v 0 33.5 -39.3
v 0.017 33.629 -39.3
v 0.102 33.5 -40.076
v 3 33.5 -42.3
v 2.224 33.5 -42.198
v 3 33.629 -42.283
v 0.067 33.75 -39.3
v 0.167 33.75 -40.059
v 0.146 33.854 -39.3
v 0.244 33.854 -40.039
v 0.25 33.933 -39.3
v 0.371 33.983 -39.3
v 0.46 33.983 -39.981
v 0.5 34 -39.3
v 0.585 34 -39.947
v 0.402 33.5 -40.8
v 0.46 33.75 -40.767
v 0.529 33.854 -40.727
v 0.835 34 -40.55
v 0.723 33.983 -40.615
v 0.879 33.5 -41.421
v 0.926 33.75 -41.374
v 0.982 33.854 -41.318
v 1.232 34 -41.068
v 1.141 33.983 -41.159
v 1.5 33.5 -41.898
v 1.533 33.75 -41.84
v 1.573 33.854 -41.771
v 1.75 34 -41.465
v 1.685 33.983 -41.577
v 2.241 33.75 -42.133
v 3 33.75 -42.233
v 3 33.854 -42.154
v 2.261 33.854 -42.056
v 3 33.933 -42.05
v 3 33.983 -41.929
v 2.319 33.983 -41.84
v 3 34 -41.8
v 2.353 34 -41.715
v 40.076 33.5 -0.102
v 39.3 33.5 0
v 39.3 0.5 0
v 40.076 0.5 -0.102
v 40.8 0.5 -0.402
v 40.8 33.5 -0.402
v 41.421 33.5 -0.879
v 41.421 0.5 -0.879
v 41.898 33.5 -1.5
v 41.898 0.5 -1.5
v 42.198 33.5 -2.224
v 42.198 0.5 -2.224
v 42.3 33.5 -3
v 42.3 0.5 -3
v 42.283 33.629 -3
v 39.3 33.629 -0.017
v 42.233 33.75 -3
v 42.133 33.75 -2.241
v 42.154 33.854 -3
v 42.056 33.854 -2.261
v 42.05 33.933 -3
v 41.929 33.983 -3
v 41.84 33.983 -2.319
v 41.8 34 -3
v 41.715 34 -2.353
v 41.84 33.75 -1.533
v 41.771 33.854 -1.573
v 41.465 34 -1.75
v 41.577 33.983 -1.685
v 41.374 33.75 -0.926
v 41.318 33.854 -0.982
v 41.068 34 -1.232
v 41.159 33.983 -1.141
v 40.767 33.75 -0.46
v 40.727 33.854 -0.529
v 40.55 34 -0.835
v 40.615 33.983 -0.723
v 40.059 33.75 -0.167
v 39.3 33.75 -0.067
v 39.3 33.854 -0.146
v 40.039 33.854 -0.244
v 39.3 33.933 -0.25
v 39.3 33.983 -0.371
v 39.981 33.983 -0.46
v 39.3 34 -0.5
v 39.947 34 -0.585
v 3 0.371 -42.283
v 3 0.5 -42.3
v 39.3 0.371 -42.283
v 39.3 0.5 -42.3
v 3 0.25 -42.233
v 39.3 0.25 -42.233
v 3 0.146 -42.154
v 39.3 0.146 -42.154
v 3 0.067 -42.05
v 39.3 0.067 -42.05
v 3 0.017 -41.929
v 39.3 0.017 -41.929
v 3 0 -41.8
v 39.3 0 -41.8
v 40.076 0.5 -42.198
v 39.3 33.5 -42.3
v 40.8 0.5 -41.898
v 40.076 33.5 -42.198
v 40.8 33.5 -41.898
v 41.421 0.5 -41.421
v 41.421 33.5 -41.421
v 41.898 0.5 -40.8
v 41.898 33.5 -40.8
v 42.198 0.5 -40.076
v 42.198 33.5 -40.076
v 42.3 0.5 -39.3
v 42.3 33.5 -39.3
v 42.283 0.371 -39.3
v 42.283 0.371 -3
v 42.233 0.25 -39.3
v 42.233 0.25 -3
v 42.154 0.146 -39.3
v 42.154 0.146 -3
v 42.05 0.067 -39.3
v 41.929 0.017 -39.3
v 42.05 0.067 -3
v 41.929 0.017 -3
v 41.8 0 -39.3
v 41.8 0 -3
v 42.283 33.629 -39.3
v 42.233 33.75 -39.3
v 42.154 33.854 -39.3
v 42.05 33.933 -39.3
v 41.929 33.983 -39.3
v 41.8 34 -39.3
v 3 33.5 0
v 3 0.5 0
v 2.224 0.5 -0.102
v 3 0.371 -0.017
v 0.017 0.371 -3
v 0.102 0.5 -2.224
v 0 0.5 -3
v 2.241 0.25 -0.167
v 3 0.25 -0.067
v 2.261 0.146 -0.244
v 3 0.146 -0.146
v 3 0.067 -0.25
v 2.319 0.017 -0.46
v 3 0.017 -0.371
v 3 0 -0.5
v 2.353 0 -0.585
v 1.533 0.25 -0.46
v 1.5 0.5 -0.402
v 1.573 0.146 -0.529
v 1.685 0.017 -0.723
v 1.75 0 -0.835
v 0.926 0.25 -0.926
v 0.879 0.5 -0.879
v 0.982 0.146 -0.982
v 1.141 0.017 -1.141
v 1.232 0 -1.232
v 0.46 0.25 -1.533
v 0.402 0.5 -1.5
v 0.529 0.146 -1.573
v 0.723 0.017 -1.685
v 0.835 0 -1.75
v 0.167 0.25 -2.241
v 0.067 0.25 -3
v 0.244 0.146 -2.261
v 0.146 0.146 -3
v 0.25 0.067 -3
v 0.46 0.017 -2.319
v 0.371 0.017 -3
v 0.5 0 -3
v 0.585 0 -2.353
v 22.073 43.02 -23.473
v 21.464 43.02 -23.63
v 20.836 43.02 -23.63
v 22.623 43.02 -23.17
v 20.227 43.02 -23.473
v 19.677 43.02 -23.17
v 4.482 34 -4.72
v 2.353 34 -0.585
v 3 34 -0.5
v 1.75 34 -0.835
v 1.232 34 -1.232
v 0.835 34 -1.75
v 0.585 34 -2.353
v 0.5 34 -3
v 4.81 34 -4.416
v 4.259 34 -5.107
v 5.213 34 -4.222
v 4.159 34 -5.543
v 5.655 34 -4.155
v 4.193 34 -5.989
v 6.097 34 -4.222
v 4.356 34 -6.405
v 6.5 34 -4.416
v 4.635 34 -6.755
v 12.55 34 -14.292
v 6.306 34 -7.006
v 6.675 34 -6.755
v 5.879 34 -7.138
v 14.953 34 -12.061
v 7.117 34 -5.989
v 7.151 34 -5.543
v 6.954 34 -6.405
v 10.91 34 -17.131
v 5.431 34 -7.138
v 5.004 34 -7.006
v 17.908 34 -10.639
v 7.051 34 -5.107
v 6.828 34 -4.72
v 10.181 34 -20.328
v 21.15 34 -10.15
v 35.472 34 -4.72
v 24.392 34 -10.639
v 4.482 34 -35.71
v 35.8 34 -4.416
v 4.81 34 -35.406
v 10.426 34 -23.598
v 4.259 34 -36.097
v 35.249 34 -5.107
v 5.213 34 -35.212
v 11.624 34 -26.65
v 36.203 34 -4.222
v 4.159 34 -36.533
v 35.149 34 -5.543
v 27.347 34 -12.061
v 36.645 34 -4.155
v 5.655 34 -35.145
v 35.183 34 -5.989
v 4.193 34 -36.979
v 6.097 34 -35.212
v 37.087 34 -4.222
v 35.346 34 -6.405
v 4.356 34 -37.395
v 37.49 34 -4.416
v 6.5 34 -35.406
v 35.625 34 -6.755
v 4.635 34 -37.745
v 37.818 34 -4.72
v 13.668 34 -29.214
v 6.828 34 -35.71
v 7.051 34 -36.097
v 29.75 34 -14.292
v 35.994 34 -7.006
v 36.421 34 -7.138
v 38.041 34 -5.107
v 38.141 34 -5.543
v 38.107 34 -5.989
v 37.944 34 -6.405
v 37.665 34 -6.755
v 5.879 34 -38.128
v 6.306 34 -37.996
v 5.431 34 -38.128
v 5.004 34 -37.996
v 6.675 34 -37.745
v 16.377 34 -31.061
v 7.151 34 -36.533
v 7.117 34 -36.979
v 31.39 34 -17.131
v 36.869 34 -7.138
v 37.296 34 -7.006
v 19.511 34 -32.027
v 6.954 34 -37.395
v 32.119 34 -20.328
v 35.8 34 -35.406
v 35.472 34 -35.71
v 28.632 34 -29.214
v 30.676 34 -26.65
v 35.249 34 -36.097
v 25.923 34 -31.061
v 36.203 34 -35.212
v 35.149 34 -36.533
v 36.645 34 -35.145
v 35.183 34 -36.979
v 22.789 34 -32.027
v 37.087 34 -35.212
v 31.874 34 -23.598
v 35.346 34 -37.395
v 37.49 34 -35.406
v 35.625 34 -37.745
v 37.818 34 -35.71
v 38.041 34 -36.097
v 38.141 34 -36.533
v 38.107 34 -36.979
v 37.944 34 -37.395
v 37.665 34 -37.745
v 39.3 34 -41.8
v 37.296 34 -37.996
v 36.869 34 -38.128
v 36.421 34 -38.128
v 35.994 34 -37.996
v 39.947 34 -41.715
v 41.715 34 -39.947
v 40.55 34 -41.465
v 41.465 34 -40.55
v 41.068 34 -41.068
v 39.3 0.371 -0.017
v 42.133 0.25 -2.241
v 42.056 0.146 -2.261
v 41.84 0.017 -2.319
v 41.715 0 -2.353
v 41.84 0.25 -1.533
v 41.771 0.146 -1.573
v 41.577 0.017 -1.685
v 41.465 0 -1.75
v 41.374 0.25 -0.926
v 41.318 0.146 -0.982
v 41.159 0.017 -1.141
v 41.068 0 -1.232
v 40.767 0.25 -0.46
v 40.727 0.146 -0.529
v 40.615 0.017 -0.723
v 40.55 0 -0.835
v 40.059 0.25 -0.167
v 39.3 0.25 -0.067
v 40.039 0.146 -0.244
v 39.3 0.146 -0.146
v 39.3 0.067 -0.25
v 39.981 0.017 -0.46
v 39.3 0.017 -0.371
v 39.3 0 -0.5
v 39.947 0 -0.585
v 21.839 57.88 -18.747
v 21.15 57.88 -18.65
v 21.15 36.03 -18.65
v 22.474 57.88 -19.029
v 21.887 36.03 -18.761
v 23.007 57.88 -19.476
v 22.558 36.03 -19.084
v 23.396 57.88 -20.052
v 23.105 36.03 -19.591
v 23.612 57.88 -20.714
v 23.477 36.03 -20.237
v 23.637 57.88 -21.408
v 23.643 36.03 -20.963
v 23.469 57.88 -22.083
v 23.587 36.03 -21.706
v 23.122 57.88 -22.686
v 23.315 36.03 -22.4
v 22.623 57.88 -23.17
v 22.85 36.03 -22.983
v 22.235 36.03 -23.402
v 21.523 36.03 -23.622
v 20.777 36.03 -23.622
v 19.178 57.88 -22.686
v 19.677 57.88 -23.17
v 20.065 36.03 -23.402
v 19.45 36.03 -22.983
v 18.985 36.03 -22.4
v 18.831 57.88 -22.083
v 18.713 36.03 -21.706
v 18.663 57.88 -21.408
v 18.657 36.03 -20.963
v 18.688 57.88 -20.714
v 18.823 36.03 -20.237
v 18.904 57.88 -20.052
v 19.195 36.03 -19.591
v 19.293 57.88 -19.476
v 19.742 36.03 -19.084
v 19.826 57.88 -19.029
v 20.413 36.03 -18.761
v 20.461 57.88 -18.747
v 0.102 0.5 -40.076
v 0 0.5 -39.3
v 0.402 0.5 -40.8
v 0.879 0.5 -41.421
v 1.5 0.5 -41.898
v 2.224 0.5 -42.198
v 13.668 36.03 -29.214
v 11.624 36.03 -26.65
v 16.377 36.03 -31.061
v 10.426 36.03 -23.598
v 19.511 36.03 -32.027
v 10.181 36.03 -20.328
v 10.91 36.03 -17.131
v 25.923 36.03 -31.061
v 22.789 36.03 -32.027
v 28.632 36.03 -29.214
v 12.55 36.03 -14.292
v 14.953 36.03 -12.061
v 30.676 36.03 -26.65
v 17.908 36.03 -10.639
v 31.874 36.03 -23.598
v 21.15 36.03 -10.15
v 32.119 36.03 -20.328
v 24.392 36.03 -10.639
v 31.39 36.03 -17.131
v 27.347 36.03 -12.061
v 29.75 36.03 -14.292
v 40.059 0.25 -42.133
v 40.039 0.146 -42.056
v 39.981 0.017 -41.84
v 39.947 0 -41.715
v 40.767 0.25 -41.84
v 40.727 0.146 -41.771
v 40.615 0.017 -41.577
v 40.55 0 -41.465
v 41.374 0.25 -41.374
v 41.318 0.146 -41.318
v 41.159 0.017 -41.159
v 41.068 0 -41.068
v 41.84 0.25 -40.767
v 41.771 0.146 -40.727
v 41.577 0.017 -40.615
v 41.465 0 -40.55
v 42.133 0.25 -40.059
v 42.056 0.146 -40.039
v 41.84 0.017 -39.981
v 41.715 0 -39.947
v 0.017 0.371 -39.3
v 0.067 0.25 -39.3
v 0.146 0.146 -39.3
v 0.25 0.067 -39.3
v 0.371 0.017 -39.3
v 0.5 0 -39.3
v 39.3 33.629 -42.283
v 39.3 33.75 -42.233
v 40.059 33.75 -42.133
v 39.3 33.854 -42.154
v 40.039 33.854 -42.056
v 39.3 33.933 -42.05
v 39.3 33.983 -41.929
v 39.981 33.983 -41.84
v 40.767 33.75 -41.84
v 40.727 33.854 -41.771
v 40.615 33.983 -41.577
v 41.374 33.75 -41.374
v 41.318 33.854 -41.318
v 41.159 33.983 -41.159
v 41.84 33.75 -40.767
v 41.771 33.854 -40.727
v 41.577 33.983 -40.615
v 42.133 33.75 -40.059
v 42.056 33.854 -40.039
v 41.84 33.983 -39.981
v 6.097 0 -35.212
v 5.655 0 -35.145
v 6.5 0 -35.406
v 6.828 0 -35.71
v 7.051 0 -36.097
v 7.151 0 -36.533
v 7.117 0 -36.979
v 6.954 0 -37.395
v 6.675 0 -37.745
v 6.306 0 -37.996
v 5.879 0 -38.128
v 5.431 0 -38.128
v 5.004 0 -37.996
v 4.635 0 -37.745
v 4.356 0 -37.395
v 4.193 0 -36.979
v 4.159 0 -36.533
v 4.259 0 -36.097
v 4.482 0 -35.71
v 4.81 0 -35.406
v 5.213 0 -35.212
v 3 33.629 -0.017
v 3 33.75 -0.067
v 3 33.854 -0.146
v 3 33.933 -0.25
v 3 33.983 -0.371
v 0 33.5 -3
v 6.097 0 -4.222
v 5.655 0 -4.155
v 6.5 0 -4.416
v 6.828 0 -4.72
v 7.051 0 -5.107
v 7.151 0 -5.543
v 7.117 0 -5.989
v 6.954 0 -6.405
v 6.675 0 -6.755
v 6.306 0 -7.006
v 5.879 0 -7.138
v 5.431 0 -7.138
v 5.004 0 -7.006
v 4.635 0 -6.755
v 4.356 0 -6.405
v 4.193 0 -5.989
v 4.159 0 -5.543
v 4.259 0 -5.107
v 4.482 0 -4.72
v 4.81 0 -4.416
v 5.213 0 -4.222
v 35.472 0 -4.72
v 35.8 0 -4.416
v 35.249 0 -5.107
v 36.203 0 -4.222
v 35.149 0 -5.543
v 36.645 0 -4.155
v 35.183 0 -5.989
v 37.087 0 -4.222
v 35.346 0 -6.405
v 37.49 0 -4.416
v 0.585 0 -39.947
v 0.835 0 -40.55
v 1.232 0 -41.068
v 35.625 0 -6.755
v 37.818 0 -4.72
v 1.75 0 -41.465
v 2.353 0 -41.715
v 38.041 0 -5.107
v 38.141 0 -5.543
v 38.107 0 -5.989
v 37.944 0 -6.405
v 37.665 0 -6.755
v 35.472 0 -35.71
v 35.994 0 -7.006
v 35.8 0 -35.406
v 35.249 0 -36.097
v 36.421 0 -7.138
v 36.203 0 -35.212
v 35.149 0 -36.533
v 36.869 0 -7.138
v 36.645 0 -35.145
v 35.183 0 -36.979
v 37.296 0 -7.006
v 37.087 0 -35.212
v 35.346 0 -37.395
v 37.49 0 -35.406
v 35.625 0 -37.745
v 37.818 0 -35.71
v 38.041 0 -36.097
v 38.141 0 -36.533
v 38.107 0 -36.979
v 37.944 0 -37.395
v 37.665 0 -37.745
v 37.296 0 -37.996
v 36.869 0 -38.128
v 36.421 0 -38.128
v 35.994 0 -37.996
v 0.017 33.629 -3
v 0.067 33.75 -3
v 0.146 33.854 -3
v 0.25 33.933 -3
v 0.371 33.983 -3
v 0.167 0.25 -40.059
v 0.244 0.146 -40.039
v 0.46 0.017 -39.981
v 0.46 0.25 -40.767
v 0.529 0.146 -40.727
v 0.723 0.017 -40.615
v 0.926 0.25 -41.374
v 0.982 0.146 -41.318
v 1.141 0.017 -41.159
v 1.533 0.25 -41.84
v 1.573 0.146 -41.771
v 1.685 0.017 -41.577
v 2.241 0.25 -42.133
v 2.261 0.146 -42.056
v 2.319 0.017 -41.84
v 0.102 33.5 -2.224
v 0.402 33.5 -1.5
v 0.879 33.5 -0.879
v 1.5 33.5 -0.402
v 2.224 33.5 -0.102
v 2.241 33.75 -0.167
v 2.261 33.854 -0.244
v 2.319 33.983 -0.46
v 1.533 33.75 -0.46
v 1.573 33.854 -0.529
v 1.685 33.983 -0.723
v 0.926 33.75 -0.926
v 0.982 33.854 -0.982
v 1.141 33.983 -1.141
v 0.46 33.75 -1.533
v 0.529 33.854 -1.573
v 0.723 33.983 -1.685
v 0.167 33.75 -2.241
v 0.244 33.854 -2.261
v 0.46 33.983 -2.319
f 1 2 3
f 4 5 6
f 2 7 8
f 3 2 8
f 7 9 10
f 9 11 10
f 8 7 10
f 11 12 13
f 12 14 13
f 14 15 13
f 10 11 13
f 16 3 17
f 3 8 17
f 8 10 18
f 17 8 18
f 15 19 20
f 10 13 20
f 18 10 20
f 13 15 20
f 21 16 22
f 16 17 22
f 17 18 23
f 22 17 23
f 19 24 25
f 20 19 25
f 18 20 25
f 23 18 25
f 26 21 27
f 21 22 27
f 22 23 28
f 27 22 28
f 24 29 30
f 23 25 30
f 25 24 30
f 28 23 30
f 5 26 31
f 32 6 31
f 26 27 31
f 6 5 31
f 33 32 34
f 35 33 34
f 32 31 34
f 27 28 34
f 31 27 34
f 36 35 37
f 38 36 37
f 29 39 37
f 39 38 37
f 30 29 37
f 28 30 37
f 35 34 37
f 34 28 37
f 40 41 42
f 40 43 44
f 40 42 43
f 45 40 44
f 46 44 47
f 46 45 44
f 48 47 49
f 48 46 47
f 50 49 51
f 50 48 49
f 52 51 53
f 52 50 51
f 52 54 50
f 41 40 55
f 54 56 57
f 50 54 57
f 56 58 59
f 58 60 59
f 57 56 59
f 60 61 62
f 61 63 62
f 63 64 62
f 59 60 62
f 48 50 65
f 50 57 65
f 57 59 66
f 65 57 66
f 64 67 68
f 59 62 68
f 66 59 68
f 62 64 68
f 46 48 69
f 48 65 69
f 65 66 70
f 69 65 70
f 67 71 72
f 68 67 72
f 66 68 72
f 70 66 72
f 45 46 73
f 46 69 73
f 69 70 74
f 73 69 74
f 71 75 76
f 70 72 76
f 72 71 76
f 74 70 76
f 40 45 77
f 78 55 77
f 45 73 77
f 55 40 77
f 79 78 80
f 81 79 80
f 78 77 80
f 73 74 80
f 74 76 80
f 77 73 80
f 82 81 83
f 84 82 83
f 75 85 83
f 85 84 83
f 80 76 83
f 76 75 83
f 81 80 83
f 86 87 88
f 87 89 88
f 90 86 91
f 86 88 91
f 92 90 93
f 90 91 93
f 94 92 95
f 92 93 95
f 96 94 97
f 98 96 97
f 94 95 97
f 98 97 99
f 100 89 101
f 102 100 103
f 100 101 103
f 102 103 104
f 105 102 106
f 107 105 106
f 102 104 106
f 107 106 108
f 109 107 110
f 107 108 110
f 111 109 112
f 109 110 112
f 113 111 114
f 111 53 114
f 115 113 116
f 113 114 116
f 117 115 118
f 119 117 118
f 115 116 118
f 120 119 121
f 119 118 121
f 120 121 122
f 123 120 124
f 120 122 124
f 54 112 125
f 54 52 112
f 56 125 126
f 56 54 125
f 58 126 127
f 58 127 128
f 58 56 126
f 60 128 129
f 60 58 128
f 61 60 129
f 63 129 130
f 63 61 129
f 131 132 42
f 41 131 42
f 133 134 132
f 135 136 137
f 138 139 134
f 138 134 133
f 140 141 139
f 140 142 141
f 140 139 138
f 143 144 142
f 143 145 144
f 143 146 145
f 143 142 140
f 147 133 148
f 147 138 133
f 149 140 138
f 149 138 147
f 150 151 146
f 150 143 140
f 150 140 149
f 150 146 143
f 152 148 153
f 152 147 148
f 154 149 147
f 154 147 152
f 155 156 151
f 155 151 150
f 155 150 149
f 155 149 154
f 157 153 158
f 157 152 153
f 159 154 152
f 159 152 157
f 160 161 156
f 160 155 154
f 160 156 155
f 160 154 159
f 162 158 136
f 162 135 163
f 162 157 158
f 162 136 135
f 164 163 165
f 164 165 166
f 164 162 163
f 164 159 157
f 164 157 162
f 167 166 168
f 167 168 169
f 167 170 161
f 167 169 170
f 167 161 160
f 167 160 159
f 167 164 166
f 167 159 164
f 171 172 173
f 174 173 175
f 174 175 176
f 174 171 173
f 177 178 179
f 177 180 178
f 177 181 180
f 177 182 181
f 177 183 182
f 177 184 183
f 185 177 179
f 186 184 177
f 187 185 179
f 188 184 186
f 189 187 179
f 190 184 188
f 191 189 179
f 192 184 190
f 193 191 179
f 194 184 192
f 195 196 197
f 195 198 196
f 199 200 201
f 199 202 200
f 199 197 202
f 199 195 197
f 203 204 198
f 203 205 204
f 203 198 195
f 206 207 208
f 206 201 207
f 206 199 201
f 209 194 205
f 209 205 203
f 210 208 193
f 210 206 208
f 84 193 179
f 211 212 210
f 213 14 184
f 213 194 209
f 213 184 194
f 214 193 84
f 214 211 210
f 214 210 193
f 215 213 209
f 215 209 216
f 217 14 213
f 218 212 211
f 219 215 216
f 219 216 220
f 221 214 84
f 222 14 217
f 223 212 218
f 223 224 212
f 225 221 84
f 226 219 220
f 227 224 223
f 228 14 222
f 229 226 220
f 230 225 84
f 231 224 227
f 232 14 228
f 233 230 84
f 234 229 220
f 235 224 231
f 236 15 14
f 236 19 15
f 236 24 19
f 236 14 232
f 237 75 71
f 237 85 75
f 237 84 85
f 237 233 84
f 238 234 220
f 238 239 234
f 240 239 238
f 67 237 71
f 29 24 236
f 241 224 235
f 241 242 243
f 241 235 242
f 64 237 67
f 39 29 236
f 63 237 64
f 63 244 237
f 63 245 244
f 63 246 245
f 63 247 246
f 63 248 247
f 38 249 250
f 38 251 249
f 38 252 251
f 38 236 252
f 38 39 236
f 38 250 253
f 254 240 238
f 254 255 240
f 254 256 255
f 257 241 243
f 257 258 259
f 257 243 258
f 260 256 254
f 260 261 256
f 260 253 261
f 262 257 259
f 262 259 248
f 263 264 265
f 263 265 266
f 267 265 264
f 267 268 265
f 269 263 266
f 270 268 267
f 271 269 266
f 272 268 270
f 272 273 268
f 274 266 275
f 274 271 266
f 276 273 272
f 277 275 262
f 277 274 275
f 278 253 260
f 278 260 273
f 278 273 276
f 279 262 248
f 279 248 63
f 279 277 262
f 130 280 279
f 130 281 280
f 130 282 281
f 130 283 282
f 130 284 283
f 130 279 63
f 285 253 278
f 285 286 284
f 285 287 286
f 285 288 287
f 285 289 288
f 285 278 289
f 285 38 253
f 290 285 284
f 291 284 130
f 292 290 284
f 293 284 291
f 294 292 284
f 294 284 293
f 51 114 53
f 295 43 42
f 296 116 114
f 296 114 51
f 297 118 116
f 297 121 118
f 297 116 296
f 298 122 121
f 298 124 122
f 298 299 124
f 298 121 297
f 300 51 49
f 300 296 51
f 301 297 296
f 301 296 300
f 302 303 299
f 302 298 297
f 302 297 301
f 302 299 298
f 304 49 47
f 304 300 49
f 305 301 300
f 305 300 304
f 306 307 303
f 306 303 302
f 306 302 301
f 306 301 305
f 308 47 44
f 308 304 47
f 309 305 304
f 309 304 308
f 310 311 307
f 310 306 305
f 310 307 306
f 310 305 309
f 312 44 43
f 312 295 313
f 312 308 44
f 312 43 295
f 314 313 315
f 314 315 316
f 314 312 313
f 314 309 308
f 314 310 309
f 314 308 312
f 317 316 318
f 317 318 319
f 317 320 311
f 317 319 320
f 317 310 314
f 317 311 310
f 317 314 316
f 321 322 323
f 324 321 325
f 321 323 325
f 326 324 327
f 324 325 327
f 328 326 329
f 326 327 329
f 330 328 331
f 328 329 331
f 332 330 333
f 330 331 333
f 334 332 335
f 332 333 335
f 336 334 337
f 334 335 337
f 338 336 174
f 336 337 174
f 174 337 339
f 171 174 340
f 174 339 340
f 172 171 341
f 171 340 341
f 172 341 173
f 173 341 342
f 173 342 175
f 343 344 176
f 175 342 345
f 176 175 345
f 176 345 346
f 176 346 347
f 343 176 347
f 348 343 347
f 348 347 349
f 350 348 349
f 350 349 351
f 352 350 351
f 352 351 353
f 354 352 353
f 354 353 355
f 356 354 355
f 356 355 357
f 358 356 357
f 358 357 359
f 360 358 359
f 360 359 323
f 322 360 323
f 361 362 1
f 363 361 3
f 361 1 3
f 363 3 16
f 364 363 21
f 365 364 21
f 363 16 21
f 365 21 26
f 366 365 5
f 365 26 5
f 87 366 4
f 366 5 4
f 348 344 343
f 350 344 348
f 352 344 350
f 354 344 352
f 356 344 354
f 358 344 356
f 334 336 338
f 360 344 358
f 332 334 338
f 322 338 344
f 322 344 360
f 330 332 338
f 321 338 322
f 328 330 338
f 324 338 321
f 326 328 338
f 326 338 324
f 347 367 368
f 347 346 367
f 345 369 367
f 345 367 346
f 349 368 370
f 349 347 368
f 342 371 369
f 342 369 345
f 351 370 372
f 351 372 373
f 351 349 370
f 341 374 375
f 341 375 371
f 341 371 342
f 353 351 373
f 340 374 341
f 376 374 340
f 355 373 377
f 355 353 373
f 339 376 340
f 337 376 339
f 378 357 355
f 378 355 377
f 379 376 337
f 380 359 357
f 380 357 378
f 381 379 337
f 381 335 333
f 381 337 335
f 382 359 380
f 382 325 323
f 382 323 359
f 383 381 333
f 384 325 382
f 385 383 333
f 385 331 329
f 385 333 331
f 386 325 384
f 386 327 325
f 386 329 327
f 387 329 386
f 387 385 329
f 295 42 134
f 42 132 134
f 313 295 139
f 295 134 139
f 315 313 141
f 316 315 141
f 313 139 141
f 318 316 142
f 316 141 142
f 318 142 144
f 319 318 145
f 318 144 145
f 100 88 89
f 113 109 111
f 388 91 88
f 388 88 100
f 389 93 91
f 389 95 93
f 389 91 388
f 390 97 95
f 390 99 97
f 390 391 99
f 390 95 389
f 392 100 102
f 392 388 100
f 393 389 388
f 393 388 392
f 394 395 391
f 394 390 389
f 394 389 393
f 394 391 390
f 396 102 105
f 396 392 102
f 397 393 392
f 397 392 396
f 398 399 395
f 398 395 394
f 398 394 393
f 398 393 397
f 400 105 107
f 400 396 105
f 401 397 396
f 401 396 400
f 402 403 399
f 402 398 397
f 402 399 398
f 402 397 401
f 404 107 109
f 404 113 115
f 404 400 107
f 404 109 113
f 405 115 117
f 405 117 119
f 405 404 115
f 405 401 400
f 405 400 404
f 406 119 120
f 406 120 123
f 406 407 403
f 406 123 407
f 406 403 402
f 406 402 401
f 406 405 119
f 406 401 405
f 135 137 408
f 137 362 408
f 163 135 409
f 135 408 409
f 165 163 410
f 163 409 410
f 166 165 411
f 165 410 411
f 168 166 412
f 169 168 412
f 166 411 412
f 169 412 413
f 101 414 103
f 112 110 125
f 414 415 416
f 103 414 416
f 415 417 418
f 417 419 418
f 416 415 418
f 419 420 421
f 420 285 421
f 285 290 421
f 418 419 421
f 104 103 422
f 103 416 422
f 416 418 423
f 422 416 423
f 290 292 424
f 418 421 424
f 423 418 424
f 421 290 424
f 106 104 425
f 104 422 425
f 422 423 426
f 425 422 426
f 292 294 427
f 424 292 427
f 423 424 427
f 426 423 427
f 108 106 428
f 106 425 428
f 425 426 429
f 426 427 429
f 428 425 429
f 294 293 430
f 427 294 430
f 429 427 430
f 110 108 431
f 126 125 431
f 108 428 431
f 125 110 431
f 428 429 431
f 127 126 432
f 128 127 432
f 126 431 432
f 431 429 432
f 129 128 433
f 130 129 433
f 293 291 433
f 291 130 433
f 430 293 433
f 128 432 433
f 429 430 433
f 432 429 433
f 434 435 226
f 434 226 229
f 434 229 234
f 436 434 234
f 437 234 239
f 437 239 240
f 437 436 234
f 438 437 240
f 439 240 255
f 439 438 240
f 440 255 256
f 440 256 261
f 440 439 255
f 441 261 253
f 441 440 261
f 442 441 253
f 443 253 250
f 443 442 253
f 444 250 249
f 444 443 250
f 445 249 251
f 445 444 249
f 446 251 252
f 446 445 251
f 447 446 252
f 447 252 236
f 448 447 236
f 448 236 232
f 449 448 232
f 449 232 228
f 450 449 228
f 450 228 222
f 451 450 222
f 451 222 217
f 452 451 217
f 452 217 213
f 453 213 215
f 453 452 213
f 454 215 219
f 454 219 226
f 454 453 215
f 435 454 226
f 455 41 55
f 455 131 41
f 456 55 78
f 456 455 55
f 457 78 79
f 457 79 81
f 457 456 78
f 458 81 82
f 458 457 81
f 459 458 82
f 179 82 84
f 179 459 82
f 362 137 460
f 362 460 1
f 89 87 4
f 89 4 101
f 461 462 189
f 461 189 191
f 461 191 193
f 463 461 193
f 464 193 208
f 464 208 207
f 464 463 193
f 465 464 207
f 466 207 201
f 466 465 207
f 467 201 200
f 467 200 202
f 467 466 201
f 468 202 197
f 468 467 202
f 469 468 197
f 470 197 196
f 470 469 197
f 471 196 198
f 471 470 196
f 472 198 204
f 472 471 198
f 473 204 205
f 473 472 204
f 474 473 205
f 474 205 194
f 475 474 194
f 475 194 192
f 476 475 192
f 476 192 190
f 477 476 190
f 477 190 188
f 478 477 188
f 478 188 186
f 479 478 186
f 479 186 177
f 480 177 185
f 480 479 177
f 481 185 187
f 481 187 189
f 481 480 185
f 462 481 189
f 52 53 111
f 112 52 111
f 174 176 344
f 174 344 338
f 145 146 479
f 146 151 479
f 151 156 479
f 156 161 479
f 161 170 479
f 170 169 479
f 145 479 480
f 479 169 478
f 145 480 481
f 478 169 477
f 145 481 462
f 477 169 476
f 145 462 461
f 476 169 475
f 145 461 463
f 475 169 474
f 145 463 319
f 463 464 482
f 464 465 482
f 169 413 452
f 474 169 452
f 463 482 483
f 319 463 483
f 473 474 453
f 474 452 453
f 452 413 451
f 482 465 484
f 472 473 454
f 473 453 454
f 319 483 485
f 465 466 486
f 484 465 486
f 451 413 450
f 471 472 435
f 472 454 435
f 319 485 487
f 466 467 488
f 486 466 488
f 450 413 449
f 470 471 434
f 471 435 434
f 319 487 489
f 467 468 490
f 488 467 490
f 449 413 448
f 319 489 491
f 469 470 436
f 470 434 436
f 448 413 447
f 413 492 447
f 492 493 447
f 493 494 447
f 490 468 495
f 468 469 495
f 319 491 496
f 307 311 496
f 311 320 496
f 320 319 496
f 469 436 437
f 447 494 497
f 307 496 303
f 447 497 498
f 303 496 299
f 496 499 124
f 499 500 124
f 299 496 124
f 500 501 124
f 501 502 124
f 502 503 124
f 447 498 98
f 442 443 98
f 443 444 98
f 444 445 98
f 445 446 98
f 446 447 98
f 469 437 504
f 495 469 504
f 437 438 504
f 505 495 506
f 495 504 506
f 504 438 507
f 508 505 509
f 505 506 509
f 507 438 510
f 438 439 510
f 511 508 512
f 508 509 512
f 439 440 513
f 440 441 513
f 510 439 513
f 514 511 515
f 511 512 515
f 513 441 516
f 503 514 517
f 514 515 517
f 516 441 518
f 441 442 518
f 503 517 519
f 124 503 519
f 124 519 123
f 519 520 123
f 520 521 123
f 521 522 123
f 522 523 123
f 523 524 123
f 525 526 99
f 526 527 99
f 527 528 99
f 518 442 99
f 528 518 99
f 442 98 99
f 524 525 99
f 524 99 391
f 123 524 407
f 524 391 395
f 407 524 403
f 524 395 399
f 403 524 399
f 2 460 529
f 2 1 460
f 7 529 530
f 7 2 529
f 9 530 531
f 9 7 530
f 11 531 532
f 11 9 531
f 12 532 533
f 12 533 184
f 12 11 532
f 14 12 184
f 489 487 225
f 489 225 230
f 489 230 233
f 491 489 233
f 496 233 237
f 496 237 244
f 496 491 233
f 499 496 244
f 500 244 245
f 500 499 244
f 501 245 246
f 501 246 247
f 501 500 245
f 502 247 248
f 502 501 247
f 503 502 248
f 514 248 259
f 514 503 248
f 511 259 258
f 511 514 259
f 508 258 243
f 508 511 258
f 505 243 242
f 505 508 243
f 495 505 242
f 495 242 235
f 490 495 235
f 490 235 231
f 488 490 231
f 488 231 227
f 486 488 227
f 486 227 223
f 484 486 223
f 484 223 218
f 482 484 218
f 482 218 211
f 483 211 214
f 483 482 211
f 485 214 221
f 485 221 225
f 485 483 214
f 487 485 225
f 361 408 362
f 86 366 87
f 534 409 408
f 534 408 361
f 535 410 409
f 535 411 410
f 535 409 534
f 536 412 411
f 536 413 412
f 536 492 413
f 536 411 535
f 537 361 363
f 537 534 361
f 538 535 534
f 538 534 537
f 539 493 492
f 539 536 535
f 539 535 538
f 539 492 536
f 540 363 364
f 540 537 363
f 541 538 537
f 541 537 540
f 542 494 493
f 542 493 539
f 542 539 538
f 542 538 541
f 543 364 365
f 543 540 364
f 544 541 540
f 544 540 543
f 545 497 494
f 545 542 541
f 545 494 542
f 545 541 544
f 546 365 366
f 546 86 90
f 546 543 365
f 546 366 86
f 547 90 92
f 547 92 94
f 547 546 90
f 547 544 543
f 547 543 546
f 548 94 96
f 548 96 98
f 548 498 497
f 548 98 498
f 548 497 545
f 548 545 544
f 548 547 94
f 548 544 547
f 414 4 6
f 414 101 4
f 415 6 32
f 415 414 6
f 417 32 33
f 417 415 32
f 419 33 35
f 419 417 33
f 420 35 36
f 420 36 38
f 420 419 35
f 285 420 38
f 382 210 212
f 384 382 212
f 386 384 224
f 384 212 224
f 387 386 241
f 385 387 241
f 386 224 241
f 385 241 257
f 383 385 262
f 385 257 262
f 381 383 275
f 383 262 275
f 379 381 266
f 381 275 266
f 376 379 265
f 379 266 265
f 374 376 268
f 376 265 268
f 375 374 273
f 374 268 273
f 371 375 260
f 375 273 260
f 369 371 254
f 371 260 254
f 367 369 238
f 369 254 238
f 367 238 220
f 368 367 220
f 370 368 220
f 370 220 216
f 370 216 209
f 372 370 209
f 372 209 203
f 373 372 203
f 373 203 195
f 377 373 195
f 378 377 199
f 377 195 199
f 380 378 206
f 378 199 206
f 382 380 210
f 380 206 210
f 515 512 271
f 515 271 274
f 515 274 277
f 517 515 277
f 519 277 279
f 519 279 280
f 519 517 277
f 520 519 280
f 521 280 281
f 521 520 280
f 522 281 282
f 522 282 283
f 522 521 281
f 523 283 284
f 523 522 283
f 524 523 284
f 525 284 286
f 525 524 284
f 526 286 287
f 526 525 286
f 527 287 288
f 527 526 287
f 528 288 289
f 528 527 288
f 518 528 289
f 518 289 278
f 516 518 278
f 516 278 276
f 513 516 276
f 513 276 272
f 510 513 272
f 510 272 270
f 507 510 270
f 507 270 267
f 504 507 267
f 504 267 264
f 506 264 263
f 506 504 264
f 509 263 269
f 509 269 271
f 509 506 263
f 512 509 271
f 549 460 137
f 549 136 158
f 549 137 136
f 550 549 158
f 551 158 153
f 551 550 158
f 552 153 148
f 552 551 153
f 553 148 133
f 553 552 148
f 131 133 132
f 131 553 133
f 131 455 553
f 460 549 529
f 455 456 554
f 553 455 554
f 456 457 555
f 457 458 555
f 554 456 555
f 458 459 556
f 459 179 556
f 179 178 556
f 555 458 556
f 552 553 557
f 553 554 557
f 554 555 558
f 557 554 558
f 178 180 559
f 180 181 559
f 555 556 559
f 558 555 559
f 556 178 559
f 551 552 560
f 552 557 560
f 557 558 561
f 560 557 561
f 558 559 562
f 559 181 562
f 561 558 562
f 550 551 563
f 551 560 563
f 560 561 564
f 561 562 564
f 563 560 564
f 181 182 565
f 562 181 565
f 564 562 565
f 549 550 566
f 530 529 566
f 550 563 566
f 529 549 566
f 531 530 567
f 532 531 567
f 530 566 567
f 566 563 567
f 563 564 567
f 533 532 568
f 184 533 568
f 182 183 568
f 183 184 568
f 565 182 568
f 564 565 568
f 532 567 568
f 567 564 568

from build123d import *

# Parameters (mm, degrees)
SKETCH2_W           = 42.3
SKETCH2_H           = 42.3
SKETCH2_R           = 1.5
BOSS_EXTRUDE1_DEPTH = 34
SKETCH3_R           = 11
BOSS_EXTRUDE2_DEPTH = 2.03
SKETCH4_R           = 2.5
BOSS_EXTRUDE3_DEPTH = 21.85
CUT_EXTRUDE1_START  = -14.86
CUT_EXTRUDE1_DEPTH  = 14.86
FILLET1_R           = 3
FILLET2_R           = 0.5


with BuildPart() as part:
    # Sketch2 → Boss-Extrude1 (new body)
    with BuildSketch(Plane(origin=(0, 0, 0), x_dir=(1, 0, 0), z_dir=(0, 1, 0))):
        with Locations((21.15, 21.15)):
            Rectangle(SKETCH2_W, SKETCH2_H)
        with Locations(Location((5.655, 36.645, 0), (0, 0, 270))):
            Circle(SKETCH2_R, mode=Mode.SUBTRACT)
        with Locations(Location((36.645, 36.645, 0), (0, 0, 270))):
            Circle(SKETCH2_R, mode=Mode.SUBTRACT)
        with Locations(Location((36.645, 5.655, 0), (0, 0, 270))):
            Circle(SKETCH2_R, mode=Mode.SUBTRACT)
        with Locations(Location((5.655, 5.655, 0), (0, 0, 270))):
            Circle(SKETCH2_R, mode=Mode.SUBTRACT)
    extrude(amount=BOSS_EXTRUDE1_DEPTH)

    # Sketch3 → Boss-Extrude2 (add)
    with BuildSketch(Plane(origin=(0, 34, 0), x_dir=(1, 0, 0), z_dir=(0, 1, 0))):
        with Locations(Location((21.15, 21.15, 0), (0, 0, 270))):
            Circle(SKETCH3_R)
    extrude(amount=BOSS_EXTRUDE2_DEPTH)

    # Sketch4 → Boss-Extrude3 (add)
    with BuildSketch(Plane(origin=(0, 36.03, 0), x_dir=(1, 0, 0), z_dir=(0, 1, 0))):
        with Locations(Location((21.15, 21.15, 0), (0, 0, 270))):
            Circle(SKETCH4_R)
    extrude(amount=BOSS_EXTRUDE3_DEPTH)

    # Sketch5 → Cut-Extrude1 (cut)
    with BuildSketch(Plane(origin=(0, 57.88, 0), x_dir=(1, 0, 0), z_dir=(0, 1, 0)).offset(CUT_EXTRUDE1_START)):
        with BuildLine():
            Line((19.677043789, 23.17), (22.622956211, 23.17))
            ThreePointArc((22.622956211, 23.17), (21.15, 23.65), (19.677043789, 23.17))
        make_face()
    extrude(amount=CUT_EXTRUDE1_DEPTH, mode=Mode.SUBTRACT)

    # Fillet1
    fillet1_edges = [part.edges().sort_by_distance(p)[0] for p in [
        (0, 17, -42.3),
        (42.3, 17, -42.3),
        (42.3, 17, 0),
        (0, 17, 0),
    ]]
    fillet(fillet1_edges, radius=FILLET1_R)

    # Fillet2
    fillet2_edges = [part.edges().sort_by_distance(p)[0] for p in [
        (0, 0, -21.15),
        (0, 34, -21.15),
        (21.15, 0, -42.3),
        (42.3, 0, -21.15),
        (21.15, 0, 0),
        (0.878679656, 0, -0.878679656),
        (41.421320344, 0, -0.878679656),
        (41.421320344, 0, -41.421320344),
        (0.878679656, 0, -41.421320344),
        (21.15, 34, -42.3),
        (21.15, 34, 0),
        (42.3, 34, -21.15),
        (0.878679656, 34, -0.878679656),
        (41.421320344, 34, -0.878679656),
        (41.421320344, 34, -41.421320344),
        (0.878679656, 34, -41.421320344),
    ]]
    fillet(fillet2_edges, radius=FILLET2_R)


solid = part.part
